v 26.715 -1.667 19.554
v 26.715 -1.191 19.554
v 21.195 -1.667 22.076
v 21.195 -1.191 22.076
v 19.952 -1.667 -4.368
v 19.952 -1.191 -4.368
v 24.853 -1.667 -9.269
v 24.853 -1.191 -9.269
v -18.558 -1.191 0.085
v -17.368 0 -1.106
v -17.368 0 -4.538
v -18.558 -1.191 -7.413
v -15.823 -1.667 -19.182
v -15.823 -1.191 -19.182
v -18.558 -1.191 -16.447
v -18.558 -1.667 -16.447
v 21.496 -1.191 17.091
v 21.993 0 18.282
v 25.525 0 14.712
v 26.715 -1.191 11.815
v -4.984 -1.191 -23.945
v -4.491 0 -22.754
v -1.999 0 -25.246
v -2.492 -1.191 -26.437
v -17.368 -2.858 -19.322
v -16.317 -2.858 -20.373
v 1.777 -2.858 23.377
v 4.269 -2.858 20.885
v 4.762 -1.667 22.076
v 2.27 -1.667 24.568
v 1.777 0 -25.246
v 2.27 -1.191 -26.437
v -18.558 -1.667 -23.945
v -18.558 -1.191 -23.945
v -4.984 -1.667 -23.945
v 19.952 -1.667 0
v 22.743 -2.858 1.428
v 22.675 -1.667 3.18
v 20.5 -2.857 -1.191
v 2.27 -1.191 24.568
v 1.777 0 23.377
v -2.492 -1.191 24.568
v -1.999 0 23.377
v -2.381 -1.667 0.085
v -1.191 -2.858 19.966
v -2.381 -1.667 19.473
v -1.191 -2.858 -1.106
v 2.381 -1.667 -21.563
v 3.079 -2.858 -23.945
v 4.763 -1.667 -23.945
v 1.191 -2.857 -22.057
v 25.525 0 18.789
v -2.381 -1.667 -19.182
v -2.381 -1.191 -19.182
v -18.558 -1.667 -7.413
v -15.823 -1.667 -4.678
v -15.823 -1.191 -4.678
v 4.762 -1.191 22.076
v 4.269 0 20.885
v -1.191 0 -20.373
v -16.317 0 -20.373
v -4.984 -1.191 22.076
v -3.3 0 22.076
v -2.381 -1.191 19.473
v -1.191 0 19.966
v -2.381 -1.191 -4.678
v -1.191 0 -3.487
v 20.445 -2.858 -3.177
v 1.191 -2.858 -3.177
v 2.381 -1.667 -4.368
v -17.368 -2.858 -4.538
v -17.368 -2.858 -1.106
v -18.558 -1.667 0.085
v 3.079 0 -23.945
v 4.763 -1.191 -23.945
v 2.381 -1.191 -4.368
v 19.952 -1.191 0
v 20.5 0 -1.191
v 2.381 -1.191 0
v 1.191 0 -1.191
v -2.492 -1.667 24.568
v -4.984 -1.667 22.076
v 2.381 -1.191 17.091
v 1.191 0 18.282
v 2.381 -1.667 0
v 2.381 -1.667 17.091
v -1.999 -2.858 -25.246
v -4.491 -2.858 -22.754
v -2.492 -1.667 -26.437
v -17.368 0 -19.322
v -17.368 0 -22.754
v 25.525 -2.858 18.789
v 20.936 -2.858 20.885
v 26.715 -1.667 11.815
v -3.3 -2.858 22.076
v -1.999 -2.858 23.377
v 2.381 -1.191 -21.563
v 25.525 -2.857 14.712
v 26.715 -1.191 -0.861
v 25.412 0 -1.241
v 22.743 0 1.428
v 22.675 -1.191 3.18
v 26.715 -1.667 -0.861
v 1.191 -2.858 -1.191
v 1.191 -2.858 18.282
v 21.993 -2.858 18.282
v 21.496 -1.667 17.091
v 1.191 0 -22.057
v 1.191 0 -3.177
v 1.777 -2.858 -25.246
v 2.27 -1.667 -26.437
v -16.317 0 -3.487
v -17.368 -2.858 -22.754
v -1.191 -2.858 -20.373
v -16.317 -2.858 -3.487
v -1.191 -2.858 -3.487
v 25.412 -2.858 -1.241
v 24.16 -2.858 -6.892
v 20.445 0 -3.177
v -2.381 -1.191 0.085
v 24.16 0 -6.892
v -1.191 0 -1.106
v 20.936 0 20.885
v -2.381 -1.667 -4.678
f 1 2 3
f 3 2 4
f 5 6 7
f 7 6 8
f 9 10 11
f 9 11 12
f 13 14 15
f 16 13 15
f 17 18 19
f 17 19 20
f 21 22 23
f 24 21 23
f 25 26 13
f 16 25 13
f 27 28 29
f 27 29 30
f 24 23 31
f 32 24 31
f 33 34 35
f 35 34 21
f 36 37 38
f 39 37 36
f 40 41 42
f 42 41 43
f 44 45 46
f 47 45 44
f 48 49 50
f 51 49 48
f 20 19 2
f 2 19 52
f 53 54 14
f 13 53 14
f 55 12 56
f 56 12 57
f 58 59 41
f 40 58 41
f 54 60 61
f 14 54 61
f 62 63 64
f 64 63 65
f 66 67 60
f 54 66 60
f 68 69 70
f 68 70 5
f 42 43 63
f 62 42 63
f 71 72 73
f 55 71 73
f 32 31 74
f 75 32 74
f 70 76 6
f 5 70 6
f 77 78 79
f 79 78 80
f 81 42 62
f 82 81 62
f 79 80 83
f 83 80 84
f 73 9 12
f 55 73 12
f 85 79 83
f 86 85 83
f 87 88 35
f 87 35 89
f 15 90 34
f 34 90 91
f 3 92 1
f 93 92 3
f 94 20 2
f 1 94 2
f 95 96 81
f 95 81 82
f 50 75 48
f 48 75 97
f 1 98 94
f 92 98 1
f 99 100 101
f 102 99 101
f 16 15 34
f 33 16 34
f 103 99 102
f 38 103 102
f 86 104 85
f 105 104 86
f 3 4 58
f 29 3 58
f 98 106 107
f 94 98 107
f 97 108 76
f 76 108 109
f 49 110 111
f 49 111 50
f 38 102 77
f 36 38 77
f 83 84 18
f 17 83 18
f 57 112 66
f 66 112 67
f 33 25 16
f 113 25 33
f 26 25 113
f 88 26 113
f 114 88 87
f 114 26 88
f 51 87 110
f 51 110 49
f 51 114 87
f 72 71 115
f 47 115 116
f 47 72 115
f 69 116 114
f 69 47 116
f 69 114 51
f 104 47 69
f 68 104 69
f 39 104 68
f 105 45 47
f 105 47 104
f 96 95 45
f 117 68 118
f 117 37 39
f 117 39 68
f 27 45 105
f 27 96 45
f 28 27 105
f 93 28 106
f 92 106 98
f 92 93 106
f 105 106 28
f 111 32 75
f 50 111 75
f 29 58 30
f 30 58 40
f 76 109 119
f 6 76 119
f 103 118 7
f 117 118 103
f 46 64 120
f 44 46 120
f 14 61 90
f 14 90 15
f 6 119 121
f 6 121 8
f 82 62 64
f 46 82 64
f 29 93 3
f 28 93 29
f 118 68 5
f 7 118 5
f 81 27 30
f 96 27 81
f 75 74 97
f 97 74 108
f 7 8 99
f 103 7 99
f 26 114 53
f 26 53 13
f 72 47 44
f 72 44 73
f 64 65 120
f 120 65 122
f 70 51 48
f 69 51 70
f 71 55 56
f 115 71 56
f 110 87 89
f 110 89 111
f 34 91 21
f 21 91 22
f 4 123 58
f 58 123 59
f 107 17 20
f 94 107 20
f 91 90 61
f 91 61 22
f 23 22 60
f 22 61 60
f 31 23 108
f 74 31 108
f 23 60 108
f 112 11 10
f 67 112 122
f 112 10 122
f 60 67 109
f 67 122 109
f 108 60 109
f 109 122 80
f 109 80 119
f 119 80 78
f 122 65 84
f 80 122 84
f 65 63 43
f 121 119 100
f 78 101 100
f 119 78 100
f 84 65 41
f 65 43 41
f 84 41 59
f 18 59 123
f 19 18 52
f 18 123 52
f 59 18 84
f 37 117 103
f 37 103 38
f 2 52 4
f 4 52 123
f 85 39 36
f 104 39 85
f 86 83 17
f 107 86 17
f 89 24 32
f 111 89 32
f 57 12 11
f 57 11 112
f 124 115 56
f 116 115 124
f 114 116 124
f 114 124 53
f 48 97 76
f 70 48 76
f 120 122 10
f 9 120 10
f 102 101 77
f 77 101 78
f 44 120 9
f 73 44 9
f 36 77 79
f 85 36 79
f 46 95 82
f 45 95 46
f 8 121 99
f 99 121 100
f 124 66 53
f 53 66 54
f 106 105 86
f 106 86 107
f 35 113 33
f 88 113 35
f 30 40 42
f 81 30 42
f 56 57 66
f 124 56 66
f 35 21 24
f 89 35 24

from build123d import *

# Parameters (mm, degrees)
F1_DEPTH = 3.81
F2_SIZE  = 1.5875
F3_SCALE = 0.75


with BuildPart() as f1:
    # F0 (on Front) → F1 (new body)
    with BuildSketch(Plane.XZ):
        Polygon((-6.6455395231, 29.4341069916), (-3.175, 25.9635674685), (-3.175, 0.1128360473), (-24.7444733058, 0.1128360473), (-24.7444733058, -9.883693457), (-21.0979438016, -6.2371639527), (-3.175, -6.2371639527), (-3.175, -25.5762760587), (-21.0979438016, -25.5762760587), (-24.7444733058, -21.9297465545), (-24.7444733058, -31.9262760587), (-22.1278171024, -31.9262760587), (-6.6455395231, -31.9262760587), (-3.3227697615, -35.2490458202), (3.0272302385, -35.2490458202), (6.35, -31.9262760587), (3.175, -28.7512760587), (3.175, -5.8234985377), (26.6026397626, -5.8234985377), (33.1378690898, -12.3587278649), (35.6206595898, -1.1474714229), (30.2332143891, 4.2399737777), (26.6026397626, 0), (3.175, 0), (3.175, 22.7885674685), (28.6609344184, 22.7885674685), (35.6206595898, 15.7537590712), (35.6206595898, 26.0716768982), (28.2596744327, 29.4341069916), (6.35, 29.4341069916), (3.0272302385, 32.7568767531), (-3.3227697615, 32.7568767531), align=None)
    extrude(amount=F1_DEPTH)

    # F2
    f2_edges = [f1.edges().sort_by_distance(p)[0] for p in [
        (17.304837, -3.81, 29.434107),
        (4.688615, -3.81, 31.095492),
        (-0.14777, -3.81, 32.756877),
        (-4.984155, -3.81, 31.095492),
        (-4.91027, -3.81, 27.698837),
        (-3.175, -3.81, 13.038202),
        (-13.959737, -3.81, 0.112836),
        (-24.744473, -3.81, -4.885429),
        (-22.921209, -3.81, -8.060429),
        (-12.136472, -3.81, -6.237164),
        (-3.175, -3.81, -15.90672),
        (-12.136472, -3.81, -25.576276),
        (-22.921209, -3.81, -23.753011),
        (-24.744473, -3.81, -26.928011),
        (-15.695006, -3.81, -31.926276),
        (-4.984155, -3.81, -33.587661),
        (-0.14777, -3.81, -35.249046),
        (4.688615, -3.81, -33.587661),
        (4.7625, -3.81, -30.338776),
        (3.175, -3.81, -17.287387),
        (14.88882, -3.81, -5.823499),
        (29.870254, -3.81, -9.091113),
        (34.379264, -3.81, -6.7531),
        (32.926937, -3.81, 1.546251),
        (28.417927, -3.81, 2.119987),
        (14.88882, -3.81, 0),
        (3.175, -3.81, 11.394284),
        (15.917967, -3.81, 22.788567),
        (32.140797, -3.81, 19.271163),
        (35.62066, -3.81, 20.912718),
        (31.940167, -3.81, 27.752892),
        (17.304837, 0, 29.434107),
        (4.688615, 0, 31.095492),
        (-0.14777, 0, 32.756877),
        (-4.984155, 0, 31.095492),
        (-4.91027, 0, 27.698837),
        (-3.175, 0, 13.038202),
        (-13.959737, 0, 0.112836),
        (-24.744473, 0, -4.885429),
        (-22.921209, 0, -8.060429),
        (-12.136472, 0, -6.237164),
        (-3.175, 0, -15.90672),
        (-12.136472, 0, -25.576276),
        (-22.921209, 0, -23.753011),
        (-24.744473, 0, -26.928011),
        (-15.695006, 0, -31.926276),
        (-4.984155, 0, -33.587661),
        (-0.14777, 0, -35.249046),
        (4.688615, 0, -33.587661),
        (4.7625, 0, -30.338776),
        (3.175, 0, -17.287387),
        (14.88882, 0, -5.823499),
        (29.870254, 0, -9.091113),
        (34.379264, 0, -6.7531),
        (32.926937, 0, 1.546251),
        (28.417927, 0, 2.119987),
        (14.88882, 0, 0),
        (3.175, 0, 11.394284),
        (15.917967, 0, 22.788567),
        (32.140797, 0, 19.271163),
        (35.62066, 0, 20.912718),
        (31.940167, 0, 27.752892),
    ]]
    chamfer(f2_edges, length=F2_SIZE)


with BuildPart() as f1_1:
    # F3: moved
    add(f1.part.scale(F3_SCALE))


solid = f1_1.part
